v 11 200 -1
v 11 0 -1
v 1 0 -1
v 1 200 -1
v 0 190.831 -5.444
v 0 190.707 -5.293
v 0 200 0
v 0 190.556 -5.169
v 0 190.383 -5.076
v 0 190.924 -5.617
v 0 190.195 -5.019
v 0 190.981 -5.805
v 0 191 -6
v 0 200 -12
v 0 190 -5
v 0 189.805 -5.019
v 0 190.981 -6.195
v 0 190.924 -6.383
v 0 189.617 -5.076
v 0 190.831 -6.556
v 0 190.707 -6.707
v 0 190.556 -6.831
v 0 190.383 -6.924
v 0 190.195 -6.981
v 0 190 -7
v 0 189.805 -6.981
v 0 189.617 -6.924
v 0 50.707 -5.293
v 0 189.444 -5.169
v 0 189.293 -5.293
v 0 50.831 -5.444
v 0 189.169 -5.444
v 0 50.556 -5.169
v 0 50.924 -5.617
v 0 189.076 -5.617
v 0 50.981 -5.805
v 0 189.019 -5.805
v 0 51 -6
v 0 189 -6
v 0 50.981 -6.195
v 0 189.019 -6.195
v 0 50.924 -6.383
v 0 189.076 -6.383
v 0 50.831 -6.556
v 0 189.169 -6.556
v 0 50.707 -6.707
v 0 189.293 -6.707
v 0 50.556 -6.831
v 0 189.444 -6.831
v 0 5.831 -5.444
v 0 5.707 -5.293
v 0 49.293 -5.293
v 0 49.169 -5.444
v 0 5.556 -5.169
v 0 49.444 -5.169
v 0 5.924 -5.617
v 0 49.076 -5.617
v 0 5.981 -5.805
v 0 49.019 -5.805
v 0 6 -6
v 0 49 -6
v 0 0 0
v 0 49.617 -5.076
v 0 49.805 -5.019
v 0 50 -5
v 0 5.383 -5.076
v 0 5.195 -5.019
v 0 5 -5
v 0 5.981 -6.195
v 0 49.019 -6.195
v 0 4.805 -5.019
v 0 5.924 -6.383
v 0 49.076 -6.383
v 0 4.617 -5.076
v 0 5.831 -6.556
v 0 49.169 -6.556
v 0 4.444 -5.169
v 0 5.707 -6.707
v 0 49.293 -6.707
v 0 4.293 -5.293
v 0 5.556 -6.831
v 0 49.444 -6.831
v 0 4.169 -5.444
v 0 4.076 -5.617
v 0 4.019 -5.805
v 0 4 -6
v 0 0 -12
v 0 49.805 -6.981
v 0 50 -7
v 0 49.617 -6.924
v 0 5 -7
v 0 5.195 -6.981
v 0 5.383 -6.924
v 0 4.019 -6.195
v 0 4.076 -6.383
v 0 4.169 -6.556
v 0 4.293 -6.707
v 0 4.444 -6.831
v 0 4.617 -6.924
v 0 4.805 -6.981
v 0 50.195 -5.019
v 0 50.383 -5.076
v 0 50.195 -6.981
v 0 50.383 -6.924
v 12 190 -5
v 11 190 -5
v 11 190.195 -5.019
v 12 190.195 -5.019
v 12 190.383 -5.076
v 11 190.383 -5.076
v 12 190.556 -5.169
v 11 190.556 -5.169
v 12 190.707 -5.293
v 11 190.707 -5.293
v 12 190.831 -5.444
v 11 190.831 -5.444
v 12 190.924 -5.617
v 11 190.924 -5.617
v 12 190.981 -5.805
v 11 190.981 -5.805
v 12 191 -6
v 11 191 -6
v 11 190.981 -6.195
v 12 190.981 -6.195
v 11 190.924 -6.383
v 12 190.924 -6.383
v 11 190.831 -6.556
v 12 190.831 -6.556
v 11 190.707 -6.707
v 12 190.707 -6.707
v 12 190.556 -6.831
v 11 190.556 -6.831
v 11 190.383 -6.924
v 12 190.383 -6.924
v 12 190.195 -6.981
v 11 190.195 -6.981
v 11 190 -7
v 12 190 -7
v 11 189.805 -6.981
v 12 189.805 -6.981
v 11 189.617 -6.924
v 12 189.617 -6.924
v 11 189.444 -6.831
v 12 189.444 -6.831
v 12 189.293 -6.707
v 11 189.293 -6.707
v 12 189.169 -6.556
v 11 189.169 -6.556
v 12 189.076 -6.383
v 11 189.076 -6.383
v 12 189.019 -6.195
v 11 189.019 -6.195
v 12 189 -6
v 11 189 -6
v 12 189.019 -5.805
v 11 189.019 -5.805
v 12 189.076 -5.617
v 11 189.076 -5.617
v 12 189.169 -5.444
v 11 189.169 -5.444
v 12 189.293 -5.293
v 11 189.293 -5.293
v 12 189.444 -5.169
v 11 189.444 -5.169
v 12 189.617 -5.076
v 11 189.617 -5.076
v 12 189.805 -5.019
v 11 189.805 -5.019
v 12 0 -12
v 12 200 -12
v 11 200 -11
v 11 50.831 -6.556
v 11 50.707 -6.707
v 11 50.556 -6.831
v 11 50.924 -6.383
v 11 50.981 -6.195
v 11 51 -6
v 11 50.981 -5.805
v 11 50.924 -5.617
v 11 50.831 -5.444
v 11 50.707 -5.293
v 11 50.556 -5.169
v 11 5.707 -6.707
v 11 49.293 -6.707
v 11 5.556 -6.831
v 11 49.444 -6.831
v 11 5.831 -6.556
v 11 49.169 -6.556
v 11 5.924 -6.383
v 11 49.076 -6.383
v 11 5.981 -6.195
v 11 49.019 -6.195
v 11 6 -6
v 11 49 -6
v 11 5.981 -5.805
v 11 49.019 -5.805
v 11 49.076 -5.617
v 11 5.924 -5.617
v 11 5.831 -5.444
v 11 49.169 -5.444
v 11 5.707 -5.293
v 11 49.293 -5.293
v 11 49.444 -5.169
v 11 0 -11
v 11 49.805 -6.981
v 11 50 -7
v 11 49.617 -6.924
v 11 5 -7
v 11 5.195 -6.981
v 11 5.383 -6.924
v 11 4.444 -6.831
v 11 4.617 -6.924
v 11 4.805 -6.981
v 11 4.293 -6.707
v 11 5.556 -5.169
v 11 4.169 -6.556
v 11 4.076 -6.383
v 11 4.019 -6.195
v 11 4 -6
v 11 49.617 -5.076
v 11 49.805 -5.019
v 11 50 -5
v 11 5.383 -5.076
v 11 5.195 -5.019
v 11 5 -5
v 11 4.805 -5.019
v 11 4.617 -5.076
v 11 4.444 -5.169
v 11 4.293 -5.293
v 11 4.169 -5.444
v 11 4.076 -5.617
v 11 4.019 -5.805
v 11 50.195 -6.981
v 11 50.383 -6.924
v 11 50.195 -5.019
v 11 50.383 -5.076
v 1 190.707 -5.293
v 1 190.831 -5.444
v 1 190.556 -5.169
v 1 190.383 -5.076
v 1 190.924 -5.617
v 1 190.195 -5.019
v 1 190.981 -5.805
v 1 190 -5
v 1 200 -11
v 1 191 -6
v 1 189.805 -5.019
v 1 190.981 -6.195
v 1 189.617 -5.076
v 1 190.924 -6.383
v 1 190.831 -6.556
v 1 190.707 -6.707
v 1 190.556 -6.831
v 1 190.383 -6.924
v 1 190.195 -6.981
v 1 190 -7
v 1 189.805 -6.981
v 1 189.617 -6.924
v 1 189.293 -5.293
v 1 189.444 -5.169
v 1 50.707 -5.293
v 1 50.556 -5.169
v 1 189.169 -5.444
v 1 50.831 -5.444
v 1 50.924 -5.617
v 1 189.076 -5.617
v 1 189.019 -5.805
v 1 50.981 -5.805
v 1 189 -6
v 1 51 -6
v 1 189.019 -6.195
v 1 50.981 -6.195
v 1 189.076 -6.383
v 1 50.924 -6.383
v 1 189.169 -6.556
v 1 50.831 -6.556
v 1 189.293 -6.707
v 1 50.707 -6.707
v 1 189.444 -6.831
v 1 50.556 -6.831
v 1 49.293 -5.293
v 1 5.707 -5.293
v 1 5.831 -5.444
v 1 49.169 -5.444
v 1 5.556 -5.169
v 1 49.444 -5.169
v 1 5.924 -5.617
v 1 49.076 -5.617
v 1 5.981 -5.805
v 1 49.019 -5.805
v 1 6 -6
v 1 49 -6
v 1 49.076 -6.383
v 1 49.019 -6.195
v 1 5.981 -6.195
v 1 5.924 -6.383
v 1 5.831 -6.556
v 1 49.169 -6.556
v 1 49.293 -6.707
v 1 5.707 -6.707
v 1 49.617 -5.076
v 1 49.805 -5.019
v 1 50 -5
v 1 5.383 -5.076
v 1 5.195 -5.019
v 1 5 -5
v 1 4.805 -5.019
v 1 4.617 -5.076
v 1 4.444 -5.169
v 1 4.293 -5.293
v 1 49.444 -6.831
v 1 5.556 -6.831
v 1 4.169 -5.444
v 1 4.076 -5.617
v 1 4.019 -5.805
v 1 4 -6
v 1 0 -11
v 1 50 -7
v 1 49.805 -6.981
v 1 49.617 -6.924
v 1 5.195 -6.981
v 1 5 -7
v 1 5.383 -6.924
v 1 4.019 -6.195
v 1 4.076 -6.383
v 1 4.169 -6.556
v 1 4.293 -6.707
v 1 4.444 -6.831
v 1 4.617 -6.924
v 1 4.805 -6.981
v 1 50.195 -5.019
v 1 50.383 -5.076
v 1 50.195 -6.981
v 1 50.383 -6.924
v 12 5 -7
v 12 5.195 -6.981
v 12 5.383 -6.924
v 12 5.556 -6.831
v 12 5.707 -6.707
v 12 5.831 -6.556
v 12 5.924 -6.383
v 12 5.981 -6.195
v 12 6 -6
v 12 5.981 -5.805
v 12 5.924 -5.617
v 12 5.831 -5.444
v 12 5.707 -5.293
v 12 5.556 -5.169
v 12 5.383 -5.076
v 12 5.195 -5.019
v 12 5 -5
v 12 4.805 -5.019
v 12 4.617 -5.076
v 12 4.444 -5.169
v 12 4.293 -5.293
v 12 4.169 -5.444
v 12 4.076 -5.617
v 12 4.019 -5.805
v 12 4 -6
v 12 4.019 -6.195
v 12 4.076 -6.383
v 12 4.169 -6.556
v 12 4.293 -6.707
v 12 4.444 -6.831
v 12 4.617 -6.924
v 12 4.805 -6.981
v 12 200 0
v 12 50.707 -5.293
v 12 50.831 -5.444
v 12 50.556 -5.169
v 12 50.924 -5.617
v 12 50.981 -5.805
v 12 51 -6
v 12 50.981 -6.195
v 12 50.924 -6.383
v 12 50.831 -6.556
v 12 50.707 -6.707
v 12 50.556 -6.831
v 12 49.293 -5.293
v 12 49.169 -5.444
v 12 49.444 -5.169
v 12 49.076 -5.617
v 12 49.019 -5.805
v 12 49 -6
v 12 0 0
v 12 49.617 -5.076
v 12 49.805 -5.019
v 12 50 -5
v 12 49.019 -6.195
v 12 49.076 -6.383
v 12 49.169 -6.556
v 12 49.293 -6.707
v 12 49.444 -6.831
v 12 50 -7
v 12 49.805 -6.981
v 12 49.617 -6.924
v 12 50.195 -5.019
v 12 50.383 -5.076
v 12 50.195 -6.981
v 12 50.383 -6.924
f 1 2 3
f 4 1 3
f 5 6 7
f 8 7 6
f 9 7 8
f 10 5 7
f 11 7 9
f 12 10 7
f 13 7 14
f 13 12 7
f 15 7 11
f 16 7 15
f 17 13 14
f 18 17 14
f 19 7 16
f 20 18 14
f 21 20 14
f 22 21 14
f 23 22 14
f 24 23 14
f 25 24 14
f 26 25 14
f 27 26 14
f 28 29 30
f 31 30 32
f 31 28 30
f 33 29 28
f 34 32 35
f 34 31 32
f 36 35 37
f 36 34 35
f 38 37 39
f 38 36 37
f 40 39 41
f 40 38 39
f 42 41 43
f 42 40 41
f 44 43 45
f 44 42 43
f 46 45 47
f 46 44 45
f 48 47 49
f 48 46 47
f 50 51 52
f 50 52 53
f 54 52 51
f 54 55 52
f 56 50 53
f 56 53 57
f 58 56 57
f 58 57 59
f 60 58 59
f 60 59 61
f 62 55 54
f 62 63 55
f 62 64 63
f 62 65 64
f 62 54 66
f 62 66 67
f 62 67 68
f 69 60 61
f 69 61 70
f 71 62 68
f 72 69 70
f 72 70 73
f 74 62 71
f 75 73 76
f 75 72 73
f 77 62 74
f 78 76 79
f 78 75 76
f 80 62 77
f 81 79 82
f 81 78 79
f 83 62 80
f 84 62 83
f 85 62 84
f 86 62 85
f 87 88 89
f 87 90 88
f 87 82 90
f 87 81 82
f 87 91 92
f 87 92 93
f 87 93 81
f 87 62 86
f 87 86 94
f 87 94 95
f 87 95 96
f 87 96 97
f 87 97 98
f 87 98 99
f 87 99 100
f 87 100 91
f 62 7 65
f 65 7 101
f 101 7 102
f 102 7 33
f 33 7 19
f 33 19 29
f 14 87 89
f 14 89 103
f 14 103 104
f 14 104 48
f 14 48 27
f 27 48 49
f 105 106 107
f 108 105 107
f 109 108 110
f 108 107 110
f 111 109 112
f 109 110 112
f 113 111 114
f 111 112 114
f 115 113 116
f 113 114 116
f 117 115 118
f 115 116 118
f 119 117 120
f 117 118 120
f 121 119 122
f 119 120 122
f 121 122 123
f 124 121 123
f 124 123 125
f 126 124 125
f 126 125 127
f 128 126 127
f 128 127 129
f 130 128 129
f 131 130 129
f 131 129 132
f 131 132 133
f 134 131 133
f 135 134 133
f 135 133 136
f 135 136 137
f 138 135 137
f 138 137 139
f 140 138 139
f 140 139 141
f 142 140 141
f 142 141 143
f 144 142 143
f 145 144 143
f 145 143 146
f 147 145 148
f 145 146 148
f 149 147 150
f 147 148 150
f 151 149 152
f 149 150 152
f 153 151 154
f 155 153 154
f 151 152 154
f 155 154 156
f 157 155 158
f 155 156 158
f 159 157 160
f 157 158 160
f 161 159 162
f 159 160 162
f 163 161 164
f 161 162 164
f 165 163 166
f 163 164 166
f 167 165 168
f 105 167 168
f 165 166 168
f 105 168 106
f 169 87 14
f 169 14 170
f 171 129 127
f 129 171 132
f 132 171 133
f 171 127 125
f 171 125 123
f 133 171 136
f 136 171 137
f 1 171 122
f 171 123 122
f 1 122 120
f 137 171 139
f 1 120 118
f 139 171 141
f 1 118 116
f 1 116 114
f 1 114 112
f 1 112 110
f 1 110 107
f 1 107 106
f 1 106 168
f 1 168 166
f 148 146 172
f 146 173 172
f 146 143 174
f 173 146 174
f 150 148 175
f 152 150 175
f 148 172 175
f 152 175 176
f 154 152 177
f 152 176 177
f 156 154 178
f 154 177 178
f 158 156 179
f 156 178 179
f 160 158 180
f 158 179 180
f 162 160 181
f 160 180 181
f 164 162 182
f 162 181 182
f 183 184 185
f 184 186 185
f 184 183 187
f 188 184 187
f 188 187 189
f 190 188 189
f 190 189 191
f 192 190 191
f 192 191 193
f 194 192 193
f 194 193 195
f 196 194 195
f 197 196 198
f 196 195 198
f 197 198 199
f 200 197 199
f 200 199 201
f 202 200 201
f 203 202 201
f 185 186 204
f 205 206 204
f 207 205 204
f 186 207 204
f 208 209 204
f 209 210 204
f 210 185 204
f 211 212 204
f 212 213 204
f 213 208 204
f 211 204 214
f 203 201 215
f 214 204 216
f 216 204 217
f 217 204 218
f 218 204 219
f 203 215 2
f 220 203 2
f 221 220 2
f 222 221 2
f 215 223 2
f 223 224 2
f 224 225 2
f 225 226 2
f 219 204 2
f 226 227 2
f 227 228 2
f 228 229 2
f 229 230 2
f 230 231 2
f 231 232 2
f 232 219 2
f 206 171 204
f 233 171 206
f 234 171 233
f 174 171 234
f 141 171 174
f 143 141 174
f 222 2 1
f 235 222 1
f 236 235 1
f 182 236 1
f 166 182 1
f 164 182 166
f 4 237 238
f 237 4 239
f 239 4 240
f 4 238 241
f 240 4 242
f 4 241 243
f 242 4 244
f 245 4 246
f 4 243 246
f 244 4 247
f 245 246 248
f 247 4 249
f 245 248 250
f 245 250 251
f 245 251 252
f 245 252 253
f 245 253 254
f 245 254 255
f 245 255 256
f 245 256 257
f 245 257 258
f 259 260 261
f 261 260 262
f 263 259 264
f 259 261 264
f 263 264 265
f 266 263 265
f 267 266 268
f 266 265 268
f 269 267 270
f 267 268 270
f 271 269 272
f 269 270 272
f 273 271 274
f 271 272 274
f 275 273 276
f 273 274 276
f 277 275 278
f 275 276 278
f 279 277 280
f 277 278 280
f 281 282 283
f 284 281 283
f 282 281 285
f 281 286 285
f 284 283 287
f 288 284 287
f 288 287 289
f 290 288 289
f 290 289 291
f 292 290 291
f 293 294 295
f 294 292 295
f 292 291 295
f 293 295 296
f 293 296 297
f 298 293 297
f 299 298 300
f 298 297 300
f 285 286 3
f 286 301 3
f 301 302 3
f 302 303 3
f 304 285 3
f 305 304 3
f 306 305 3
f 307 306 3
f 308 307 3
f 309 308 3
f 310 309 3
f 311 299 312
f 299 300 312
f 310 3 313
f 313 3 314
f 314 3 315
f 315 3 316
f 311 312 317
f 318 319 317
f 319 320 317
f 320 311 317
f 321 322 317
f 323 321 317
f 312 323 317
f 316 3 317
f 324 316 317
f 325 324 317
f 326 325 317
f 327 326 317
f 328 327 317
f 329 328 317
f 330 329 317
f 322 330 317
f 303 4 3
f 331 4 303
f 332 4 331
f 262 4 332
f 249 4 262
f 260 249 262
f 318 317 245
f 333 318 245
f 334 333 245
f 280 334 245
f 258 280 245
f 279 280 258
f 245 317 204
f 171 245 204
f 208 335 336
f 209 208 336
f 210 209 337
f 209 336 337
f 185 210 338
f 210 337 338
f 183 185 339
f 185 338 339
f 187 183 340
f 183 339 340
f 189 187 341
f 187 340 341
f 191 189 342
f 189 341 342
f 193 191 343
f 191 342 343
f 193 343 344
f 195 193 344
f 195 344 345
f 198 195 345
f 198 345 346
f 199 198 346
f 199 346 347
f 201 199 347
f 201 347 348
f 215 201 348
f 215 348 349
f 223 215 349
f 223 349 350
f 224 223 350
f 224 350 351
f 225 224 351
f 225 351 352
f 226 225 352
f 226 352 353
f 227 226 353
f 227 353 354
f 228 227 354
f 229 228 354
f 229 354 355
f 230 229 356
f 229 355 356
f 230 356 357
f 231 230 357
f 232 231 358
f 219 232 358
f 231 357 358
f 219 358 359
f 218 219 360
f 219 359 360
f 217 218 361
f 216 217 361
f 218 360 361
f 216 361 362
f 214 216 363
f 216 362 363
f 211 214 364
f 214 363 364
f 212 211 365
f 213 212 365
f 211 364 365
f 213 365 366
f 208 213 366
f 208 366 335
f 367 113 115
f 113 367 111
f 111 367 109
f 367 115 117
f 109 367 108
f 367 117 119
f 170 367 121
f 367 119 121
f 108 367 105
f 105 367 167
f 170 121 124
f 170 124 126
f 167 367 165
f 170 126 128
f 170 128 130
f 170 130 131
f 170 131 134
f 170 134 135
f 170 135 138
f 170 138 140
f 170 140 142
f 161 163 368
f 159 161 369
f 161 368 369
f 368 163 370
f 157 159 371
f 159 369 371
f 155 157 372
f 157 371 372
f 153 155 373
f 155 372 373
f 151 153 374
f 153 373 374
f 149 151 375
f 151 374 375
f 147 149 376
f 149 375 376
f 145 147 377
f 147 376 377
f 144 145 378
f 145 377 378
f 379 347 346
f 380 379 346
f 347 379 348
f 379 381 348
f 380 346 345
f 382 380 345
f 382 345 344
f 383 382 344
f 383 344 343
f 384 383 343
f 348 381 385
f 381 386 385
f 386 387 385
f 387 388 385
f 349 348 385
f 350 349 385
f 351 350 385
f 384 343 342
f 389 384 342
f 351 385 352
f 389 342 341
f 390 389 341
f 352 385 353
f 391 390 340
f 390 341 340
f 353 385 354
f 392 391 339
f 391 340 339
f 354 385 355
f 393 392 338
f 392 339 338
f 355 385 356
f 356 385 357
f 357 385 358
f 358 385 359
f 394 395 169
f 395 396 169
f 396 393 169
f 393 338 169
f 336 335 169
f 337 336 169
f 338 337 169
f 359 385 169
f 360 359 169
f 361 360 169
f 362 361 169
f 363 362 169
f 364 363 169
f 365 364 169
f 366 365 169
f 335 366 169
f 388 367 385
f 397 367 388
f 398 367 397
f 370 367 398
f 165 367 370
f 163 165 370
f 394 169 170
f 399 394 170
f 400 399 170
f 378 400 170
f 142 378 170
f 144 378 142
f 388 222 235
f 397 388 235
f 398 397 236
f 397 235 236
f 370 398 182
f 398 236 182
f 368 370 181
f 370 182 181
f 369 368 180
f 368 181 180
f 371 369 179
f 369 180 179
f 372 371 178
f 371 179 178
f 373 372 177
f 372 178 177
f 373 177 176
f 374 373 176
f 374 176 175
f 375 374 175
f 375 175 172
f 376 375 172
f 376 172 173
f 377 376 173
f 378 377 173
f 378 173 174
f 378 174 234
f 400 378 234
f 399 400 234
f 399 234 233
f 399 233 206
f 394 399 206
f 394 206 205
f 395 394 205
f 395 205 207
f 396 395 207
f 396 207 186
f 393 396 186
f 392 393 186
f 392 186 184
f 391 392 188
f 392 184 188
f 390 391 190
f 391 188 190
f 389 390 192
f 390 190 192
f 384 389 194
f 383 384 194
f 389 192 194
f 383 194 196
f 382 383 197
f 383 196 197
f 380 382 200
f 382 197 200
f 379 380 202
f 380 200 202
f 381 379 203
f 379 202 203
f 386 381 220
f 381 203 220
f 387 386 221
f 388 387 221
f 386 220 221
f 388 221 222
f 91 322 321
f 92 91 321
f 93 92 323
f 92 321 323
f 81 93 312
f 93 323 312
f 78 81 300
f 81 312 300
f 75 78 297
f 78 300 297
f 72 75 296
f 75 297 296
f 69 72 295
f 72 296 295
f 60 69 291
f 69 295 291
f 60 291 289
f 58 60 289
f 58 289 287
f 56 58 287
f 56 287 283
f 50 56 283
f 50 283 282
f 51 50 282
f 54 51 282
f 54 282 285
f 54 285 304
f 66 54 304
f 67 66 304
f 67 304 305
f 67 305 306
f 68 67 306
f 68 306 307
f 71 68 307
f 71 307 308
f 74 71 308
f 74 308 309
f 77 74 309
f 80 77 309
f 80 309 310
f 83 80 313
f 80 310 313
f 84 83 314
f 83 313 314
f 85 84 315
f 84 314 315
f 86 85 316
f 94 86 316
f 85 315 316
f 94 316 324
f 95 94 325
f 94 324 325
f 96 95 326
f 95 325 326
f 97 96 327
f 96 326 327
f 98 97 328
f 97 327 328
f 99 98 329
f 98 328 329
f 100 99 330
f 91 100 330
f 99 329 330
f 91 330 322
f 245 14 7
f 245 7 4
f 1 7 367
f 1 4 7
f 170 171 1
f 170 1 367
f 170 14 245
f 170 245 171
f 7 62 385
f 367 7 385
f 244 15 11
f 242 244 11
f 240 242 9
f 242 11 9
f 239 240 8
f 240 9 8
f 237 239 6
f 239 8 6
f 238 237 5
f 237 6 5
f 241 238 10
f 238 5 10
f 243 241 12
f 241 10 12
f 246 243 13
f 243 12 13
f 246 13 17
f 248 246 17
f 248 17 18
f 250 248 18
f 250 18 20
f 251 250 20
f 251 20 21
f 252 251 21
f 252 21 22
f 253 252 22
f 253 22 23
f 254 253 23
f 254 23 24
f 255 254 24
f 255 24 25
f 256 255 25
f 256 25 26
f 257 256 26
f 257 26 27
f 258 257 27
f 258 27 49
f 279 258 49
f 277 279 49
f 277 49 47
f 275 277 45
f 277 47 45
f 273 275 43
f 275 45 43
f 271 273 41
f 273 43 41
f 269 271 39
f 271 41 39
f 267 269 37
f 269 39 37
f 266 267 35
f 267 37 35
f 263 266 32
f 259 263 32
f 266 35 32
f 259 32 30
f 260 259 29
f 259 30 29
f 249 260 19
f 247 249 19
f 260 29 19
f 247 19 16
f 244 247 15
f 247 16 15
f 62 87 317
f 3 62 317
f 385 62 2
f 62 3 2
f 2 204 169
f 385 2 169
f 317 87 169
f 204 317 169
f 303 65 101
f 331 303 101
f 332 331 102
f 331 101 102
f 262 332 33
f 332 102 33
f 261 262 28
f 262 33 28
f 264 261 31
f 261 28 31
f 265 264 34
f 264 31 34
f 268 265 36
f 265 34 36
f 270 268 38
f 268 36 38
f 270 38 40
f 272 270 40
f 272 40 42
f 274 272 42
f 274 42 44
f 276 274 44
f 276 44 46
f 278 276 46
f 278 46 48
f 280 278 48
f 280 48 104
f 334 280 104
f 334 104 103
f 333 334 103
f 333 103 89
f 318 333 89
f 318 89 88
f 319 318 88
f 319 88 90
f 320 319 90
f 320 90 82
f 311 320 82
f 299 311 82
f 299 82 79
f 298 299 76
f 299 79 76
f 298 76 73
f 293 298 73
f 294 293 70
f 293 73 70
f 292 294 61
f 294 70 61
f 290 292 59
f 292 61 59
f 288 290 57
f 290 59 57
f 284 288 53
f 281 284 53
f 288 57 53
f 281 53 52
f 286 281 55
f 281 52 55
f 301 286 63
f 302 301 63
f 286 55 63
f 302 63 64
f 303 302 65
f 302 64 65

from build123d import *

# Parameters (mm, degrees)
SKETCH_1_W          = 12
SKETCH_1_H          = 12
SKETCH_1_W_2        = 8
SKETCH_1_H_2        = 8
EXTRUDE_1_DEPTH     = 200
CUT_EXTRUDE_1_DEPTH = 12
CUT_EXTRUDE_3_DEPTH = 200
SKETCH_6_R          = 1
CUT_EXTRUDE_4_DEPTH = 12
SKETCH_7_R          = 1
CUT_EXTRUDE_5_DEPTH = 12


with BuildPart() as part:
    # 草图1 → 凸台-拉伸1 (new body)
    with BuildSketch(Plane(origin=(0, 0, 0), x_dir=(1, 0, 0), z_dir=(0, 1, 0))):
        with Locations((6, 6)):
            Rectangle(SKETCH_1_W, SKETCH_1_H)
        with Locations((6, 6)):
            Rectangle(SKETCH_1_W_2, SKETCH_1_H_2, mode=Mode.SUBTRACT)
    extrude(amount=EXTRUDE_1_DEPTH)

    # 草图2 → 切除-拉伸1 (cut)
    with BuildSketch(Plane.ZY):
        with BuildLine():
            ThreePointArc((-7, 190), (-6, 189), (-5, 190))
            Line((-5, 190), (-7, 190))
        make_face()
        with BuildLine():
            Line((-7, 190), (-5, 190))
            ThreePointArc((-5, 190), (-6, 191), (-7, 190))
        make_face()
    extrude(amount=-CUT_EXTRUDE_1_DEPTH, mode=Mode.SUBTRACT)

    # 草图4 → 切除-拉伸3 (cut)
    with BuildSketch(Plane(origin=(0, 0, 0), x_dir=(-1, 0, 0), z_dir=(0, -1, 0))):
        Polygon((-11, 6), (-11, 1), (-1, 1), (-1, 11), (-11, 11), align=None)
    extrude(amount=-CUT_EXTRUDE_3_DEPTH, mode=Mode.SUBTRACT)

    # 草图6 → 切除-拉伸4 (cut)
    with BuildSketch(Plane(origin=(12, 0, 0), x_dir=(0, 0, -1), z_dir=(1, 0, 0))):
        with Locations((6, 5)):
            Circle(SKETCH_6_R)
    extrude(amount=-CUT_EXTRUDE_4_DEPTH, mode=Mode.SUBTRACT)

    # 草图7 → 切除-拉伸5 (cut)
    with BuildSketch(Plane.ZY):
        with Locations((-6, 50)):
            Circle(SKETCH_7_R)
    extrude(amount=-CUT_EXTRUDE_5_DEPTH, mode=Mode.SUBTRACT)


solid = part.part
